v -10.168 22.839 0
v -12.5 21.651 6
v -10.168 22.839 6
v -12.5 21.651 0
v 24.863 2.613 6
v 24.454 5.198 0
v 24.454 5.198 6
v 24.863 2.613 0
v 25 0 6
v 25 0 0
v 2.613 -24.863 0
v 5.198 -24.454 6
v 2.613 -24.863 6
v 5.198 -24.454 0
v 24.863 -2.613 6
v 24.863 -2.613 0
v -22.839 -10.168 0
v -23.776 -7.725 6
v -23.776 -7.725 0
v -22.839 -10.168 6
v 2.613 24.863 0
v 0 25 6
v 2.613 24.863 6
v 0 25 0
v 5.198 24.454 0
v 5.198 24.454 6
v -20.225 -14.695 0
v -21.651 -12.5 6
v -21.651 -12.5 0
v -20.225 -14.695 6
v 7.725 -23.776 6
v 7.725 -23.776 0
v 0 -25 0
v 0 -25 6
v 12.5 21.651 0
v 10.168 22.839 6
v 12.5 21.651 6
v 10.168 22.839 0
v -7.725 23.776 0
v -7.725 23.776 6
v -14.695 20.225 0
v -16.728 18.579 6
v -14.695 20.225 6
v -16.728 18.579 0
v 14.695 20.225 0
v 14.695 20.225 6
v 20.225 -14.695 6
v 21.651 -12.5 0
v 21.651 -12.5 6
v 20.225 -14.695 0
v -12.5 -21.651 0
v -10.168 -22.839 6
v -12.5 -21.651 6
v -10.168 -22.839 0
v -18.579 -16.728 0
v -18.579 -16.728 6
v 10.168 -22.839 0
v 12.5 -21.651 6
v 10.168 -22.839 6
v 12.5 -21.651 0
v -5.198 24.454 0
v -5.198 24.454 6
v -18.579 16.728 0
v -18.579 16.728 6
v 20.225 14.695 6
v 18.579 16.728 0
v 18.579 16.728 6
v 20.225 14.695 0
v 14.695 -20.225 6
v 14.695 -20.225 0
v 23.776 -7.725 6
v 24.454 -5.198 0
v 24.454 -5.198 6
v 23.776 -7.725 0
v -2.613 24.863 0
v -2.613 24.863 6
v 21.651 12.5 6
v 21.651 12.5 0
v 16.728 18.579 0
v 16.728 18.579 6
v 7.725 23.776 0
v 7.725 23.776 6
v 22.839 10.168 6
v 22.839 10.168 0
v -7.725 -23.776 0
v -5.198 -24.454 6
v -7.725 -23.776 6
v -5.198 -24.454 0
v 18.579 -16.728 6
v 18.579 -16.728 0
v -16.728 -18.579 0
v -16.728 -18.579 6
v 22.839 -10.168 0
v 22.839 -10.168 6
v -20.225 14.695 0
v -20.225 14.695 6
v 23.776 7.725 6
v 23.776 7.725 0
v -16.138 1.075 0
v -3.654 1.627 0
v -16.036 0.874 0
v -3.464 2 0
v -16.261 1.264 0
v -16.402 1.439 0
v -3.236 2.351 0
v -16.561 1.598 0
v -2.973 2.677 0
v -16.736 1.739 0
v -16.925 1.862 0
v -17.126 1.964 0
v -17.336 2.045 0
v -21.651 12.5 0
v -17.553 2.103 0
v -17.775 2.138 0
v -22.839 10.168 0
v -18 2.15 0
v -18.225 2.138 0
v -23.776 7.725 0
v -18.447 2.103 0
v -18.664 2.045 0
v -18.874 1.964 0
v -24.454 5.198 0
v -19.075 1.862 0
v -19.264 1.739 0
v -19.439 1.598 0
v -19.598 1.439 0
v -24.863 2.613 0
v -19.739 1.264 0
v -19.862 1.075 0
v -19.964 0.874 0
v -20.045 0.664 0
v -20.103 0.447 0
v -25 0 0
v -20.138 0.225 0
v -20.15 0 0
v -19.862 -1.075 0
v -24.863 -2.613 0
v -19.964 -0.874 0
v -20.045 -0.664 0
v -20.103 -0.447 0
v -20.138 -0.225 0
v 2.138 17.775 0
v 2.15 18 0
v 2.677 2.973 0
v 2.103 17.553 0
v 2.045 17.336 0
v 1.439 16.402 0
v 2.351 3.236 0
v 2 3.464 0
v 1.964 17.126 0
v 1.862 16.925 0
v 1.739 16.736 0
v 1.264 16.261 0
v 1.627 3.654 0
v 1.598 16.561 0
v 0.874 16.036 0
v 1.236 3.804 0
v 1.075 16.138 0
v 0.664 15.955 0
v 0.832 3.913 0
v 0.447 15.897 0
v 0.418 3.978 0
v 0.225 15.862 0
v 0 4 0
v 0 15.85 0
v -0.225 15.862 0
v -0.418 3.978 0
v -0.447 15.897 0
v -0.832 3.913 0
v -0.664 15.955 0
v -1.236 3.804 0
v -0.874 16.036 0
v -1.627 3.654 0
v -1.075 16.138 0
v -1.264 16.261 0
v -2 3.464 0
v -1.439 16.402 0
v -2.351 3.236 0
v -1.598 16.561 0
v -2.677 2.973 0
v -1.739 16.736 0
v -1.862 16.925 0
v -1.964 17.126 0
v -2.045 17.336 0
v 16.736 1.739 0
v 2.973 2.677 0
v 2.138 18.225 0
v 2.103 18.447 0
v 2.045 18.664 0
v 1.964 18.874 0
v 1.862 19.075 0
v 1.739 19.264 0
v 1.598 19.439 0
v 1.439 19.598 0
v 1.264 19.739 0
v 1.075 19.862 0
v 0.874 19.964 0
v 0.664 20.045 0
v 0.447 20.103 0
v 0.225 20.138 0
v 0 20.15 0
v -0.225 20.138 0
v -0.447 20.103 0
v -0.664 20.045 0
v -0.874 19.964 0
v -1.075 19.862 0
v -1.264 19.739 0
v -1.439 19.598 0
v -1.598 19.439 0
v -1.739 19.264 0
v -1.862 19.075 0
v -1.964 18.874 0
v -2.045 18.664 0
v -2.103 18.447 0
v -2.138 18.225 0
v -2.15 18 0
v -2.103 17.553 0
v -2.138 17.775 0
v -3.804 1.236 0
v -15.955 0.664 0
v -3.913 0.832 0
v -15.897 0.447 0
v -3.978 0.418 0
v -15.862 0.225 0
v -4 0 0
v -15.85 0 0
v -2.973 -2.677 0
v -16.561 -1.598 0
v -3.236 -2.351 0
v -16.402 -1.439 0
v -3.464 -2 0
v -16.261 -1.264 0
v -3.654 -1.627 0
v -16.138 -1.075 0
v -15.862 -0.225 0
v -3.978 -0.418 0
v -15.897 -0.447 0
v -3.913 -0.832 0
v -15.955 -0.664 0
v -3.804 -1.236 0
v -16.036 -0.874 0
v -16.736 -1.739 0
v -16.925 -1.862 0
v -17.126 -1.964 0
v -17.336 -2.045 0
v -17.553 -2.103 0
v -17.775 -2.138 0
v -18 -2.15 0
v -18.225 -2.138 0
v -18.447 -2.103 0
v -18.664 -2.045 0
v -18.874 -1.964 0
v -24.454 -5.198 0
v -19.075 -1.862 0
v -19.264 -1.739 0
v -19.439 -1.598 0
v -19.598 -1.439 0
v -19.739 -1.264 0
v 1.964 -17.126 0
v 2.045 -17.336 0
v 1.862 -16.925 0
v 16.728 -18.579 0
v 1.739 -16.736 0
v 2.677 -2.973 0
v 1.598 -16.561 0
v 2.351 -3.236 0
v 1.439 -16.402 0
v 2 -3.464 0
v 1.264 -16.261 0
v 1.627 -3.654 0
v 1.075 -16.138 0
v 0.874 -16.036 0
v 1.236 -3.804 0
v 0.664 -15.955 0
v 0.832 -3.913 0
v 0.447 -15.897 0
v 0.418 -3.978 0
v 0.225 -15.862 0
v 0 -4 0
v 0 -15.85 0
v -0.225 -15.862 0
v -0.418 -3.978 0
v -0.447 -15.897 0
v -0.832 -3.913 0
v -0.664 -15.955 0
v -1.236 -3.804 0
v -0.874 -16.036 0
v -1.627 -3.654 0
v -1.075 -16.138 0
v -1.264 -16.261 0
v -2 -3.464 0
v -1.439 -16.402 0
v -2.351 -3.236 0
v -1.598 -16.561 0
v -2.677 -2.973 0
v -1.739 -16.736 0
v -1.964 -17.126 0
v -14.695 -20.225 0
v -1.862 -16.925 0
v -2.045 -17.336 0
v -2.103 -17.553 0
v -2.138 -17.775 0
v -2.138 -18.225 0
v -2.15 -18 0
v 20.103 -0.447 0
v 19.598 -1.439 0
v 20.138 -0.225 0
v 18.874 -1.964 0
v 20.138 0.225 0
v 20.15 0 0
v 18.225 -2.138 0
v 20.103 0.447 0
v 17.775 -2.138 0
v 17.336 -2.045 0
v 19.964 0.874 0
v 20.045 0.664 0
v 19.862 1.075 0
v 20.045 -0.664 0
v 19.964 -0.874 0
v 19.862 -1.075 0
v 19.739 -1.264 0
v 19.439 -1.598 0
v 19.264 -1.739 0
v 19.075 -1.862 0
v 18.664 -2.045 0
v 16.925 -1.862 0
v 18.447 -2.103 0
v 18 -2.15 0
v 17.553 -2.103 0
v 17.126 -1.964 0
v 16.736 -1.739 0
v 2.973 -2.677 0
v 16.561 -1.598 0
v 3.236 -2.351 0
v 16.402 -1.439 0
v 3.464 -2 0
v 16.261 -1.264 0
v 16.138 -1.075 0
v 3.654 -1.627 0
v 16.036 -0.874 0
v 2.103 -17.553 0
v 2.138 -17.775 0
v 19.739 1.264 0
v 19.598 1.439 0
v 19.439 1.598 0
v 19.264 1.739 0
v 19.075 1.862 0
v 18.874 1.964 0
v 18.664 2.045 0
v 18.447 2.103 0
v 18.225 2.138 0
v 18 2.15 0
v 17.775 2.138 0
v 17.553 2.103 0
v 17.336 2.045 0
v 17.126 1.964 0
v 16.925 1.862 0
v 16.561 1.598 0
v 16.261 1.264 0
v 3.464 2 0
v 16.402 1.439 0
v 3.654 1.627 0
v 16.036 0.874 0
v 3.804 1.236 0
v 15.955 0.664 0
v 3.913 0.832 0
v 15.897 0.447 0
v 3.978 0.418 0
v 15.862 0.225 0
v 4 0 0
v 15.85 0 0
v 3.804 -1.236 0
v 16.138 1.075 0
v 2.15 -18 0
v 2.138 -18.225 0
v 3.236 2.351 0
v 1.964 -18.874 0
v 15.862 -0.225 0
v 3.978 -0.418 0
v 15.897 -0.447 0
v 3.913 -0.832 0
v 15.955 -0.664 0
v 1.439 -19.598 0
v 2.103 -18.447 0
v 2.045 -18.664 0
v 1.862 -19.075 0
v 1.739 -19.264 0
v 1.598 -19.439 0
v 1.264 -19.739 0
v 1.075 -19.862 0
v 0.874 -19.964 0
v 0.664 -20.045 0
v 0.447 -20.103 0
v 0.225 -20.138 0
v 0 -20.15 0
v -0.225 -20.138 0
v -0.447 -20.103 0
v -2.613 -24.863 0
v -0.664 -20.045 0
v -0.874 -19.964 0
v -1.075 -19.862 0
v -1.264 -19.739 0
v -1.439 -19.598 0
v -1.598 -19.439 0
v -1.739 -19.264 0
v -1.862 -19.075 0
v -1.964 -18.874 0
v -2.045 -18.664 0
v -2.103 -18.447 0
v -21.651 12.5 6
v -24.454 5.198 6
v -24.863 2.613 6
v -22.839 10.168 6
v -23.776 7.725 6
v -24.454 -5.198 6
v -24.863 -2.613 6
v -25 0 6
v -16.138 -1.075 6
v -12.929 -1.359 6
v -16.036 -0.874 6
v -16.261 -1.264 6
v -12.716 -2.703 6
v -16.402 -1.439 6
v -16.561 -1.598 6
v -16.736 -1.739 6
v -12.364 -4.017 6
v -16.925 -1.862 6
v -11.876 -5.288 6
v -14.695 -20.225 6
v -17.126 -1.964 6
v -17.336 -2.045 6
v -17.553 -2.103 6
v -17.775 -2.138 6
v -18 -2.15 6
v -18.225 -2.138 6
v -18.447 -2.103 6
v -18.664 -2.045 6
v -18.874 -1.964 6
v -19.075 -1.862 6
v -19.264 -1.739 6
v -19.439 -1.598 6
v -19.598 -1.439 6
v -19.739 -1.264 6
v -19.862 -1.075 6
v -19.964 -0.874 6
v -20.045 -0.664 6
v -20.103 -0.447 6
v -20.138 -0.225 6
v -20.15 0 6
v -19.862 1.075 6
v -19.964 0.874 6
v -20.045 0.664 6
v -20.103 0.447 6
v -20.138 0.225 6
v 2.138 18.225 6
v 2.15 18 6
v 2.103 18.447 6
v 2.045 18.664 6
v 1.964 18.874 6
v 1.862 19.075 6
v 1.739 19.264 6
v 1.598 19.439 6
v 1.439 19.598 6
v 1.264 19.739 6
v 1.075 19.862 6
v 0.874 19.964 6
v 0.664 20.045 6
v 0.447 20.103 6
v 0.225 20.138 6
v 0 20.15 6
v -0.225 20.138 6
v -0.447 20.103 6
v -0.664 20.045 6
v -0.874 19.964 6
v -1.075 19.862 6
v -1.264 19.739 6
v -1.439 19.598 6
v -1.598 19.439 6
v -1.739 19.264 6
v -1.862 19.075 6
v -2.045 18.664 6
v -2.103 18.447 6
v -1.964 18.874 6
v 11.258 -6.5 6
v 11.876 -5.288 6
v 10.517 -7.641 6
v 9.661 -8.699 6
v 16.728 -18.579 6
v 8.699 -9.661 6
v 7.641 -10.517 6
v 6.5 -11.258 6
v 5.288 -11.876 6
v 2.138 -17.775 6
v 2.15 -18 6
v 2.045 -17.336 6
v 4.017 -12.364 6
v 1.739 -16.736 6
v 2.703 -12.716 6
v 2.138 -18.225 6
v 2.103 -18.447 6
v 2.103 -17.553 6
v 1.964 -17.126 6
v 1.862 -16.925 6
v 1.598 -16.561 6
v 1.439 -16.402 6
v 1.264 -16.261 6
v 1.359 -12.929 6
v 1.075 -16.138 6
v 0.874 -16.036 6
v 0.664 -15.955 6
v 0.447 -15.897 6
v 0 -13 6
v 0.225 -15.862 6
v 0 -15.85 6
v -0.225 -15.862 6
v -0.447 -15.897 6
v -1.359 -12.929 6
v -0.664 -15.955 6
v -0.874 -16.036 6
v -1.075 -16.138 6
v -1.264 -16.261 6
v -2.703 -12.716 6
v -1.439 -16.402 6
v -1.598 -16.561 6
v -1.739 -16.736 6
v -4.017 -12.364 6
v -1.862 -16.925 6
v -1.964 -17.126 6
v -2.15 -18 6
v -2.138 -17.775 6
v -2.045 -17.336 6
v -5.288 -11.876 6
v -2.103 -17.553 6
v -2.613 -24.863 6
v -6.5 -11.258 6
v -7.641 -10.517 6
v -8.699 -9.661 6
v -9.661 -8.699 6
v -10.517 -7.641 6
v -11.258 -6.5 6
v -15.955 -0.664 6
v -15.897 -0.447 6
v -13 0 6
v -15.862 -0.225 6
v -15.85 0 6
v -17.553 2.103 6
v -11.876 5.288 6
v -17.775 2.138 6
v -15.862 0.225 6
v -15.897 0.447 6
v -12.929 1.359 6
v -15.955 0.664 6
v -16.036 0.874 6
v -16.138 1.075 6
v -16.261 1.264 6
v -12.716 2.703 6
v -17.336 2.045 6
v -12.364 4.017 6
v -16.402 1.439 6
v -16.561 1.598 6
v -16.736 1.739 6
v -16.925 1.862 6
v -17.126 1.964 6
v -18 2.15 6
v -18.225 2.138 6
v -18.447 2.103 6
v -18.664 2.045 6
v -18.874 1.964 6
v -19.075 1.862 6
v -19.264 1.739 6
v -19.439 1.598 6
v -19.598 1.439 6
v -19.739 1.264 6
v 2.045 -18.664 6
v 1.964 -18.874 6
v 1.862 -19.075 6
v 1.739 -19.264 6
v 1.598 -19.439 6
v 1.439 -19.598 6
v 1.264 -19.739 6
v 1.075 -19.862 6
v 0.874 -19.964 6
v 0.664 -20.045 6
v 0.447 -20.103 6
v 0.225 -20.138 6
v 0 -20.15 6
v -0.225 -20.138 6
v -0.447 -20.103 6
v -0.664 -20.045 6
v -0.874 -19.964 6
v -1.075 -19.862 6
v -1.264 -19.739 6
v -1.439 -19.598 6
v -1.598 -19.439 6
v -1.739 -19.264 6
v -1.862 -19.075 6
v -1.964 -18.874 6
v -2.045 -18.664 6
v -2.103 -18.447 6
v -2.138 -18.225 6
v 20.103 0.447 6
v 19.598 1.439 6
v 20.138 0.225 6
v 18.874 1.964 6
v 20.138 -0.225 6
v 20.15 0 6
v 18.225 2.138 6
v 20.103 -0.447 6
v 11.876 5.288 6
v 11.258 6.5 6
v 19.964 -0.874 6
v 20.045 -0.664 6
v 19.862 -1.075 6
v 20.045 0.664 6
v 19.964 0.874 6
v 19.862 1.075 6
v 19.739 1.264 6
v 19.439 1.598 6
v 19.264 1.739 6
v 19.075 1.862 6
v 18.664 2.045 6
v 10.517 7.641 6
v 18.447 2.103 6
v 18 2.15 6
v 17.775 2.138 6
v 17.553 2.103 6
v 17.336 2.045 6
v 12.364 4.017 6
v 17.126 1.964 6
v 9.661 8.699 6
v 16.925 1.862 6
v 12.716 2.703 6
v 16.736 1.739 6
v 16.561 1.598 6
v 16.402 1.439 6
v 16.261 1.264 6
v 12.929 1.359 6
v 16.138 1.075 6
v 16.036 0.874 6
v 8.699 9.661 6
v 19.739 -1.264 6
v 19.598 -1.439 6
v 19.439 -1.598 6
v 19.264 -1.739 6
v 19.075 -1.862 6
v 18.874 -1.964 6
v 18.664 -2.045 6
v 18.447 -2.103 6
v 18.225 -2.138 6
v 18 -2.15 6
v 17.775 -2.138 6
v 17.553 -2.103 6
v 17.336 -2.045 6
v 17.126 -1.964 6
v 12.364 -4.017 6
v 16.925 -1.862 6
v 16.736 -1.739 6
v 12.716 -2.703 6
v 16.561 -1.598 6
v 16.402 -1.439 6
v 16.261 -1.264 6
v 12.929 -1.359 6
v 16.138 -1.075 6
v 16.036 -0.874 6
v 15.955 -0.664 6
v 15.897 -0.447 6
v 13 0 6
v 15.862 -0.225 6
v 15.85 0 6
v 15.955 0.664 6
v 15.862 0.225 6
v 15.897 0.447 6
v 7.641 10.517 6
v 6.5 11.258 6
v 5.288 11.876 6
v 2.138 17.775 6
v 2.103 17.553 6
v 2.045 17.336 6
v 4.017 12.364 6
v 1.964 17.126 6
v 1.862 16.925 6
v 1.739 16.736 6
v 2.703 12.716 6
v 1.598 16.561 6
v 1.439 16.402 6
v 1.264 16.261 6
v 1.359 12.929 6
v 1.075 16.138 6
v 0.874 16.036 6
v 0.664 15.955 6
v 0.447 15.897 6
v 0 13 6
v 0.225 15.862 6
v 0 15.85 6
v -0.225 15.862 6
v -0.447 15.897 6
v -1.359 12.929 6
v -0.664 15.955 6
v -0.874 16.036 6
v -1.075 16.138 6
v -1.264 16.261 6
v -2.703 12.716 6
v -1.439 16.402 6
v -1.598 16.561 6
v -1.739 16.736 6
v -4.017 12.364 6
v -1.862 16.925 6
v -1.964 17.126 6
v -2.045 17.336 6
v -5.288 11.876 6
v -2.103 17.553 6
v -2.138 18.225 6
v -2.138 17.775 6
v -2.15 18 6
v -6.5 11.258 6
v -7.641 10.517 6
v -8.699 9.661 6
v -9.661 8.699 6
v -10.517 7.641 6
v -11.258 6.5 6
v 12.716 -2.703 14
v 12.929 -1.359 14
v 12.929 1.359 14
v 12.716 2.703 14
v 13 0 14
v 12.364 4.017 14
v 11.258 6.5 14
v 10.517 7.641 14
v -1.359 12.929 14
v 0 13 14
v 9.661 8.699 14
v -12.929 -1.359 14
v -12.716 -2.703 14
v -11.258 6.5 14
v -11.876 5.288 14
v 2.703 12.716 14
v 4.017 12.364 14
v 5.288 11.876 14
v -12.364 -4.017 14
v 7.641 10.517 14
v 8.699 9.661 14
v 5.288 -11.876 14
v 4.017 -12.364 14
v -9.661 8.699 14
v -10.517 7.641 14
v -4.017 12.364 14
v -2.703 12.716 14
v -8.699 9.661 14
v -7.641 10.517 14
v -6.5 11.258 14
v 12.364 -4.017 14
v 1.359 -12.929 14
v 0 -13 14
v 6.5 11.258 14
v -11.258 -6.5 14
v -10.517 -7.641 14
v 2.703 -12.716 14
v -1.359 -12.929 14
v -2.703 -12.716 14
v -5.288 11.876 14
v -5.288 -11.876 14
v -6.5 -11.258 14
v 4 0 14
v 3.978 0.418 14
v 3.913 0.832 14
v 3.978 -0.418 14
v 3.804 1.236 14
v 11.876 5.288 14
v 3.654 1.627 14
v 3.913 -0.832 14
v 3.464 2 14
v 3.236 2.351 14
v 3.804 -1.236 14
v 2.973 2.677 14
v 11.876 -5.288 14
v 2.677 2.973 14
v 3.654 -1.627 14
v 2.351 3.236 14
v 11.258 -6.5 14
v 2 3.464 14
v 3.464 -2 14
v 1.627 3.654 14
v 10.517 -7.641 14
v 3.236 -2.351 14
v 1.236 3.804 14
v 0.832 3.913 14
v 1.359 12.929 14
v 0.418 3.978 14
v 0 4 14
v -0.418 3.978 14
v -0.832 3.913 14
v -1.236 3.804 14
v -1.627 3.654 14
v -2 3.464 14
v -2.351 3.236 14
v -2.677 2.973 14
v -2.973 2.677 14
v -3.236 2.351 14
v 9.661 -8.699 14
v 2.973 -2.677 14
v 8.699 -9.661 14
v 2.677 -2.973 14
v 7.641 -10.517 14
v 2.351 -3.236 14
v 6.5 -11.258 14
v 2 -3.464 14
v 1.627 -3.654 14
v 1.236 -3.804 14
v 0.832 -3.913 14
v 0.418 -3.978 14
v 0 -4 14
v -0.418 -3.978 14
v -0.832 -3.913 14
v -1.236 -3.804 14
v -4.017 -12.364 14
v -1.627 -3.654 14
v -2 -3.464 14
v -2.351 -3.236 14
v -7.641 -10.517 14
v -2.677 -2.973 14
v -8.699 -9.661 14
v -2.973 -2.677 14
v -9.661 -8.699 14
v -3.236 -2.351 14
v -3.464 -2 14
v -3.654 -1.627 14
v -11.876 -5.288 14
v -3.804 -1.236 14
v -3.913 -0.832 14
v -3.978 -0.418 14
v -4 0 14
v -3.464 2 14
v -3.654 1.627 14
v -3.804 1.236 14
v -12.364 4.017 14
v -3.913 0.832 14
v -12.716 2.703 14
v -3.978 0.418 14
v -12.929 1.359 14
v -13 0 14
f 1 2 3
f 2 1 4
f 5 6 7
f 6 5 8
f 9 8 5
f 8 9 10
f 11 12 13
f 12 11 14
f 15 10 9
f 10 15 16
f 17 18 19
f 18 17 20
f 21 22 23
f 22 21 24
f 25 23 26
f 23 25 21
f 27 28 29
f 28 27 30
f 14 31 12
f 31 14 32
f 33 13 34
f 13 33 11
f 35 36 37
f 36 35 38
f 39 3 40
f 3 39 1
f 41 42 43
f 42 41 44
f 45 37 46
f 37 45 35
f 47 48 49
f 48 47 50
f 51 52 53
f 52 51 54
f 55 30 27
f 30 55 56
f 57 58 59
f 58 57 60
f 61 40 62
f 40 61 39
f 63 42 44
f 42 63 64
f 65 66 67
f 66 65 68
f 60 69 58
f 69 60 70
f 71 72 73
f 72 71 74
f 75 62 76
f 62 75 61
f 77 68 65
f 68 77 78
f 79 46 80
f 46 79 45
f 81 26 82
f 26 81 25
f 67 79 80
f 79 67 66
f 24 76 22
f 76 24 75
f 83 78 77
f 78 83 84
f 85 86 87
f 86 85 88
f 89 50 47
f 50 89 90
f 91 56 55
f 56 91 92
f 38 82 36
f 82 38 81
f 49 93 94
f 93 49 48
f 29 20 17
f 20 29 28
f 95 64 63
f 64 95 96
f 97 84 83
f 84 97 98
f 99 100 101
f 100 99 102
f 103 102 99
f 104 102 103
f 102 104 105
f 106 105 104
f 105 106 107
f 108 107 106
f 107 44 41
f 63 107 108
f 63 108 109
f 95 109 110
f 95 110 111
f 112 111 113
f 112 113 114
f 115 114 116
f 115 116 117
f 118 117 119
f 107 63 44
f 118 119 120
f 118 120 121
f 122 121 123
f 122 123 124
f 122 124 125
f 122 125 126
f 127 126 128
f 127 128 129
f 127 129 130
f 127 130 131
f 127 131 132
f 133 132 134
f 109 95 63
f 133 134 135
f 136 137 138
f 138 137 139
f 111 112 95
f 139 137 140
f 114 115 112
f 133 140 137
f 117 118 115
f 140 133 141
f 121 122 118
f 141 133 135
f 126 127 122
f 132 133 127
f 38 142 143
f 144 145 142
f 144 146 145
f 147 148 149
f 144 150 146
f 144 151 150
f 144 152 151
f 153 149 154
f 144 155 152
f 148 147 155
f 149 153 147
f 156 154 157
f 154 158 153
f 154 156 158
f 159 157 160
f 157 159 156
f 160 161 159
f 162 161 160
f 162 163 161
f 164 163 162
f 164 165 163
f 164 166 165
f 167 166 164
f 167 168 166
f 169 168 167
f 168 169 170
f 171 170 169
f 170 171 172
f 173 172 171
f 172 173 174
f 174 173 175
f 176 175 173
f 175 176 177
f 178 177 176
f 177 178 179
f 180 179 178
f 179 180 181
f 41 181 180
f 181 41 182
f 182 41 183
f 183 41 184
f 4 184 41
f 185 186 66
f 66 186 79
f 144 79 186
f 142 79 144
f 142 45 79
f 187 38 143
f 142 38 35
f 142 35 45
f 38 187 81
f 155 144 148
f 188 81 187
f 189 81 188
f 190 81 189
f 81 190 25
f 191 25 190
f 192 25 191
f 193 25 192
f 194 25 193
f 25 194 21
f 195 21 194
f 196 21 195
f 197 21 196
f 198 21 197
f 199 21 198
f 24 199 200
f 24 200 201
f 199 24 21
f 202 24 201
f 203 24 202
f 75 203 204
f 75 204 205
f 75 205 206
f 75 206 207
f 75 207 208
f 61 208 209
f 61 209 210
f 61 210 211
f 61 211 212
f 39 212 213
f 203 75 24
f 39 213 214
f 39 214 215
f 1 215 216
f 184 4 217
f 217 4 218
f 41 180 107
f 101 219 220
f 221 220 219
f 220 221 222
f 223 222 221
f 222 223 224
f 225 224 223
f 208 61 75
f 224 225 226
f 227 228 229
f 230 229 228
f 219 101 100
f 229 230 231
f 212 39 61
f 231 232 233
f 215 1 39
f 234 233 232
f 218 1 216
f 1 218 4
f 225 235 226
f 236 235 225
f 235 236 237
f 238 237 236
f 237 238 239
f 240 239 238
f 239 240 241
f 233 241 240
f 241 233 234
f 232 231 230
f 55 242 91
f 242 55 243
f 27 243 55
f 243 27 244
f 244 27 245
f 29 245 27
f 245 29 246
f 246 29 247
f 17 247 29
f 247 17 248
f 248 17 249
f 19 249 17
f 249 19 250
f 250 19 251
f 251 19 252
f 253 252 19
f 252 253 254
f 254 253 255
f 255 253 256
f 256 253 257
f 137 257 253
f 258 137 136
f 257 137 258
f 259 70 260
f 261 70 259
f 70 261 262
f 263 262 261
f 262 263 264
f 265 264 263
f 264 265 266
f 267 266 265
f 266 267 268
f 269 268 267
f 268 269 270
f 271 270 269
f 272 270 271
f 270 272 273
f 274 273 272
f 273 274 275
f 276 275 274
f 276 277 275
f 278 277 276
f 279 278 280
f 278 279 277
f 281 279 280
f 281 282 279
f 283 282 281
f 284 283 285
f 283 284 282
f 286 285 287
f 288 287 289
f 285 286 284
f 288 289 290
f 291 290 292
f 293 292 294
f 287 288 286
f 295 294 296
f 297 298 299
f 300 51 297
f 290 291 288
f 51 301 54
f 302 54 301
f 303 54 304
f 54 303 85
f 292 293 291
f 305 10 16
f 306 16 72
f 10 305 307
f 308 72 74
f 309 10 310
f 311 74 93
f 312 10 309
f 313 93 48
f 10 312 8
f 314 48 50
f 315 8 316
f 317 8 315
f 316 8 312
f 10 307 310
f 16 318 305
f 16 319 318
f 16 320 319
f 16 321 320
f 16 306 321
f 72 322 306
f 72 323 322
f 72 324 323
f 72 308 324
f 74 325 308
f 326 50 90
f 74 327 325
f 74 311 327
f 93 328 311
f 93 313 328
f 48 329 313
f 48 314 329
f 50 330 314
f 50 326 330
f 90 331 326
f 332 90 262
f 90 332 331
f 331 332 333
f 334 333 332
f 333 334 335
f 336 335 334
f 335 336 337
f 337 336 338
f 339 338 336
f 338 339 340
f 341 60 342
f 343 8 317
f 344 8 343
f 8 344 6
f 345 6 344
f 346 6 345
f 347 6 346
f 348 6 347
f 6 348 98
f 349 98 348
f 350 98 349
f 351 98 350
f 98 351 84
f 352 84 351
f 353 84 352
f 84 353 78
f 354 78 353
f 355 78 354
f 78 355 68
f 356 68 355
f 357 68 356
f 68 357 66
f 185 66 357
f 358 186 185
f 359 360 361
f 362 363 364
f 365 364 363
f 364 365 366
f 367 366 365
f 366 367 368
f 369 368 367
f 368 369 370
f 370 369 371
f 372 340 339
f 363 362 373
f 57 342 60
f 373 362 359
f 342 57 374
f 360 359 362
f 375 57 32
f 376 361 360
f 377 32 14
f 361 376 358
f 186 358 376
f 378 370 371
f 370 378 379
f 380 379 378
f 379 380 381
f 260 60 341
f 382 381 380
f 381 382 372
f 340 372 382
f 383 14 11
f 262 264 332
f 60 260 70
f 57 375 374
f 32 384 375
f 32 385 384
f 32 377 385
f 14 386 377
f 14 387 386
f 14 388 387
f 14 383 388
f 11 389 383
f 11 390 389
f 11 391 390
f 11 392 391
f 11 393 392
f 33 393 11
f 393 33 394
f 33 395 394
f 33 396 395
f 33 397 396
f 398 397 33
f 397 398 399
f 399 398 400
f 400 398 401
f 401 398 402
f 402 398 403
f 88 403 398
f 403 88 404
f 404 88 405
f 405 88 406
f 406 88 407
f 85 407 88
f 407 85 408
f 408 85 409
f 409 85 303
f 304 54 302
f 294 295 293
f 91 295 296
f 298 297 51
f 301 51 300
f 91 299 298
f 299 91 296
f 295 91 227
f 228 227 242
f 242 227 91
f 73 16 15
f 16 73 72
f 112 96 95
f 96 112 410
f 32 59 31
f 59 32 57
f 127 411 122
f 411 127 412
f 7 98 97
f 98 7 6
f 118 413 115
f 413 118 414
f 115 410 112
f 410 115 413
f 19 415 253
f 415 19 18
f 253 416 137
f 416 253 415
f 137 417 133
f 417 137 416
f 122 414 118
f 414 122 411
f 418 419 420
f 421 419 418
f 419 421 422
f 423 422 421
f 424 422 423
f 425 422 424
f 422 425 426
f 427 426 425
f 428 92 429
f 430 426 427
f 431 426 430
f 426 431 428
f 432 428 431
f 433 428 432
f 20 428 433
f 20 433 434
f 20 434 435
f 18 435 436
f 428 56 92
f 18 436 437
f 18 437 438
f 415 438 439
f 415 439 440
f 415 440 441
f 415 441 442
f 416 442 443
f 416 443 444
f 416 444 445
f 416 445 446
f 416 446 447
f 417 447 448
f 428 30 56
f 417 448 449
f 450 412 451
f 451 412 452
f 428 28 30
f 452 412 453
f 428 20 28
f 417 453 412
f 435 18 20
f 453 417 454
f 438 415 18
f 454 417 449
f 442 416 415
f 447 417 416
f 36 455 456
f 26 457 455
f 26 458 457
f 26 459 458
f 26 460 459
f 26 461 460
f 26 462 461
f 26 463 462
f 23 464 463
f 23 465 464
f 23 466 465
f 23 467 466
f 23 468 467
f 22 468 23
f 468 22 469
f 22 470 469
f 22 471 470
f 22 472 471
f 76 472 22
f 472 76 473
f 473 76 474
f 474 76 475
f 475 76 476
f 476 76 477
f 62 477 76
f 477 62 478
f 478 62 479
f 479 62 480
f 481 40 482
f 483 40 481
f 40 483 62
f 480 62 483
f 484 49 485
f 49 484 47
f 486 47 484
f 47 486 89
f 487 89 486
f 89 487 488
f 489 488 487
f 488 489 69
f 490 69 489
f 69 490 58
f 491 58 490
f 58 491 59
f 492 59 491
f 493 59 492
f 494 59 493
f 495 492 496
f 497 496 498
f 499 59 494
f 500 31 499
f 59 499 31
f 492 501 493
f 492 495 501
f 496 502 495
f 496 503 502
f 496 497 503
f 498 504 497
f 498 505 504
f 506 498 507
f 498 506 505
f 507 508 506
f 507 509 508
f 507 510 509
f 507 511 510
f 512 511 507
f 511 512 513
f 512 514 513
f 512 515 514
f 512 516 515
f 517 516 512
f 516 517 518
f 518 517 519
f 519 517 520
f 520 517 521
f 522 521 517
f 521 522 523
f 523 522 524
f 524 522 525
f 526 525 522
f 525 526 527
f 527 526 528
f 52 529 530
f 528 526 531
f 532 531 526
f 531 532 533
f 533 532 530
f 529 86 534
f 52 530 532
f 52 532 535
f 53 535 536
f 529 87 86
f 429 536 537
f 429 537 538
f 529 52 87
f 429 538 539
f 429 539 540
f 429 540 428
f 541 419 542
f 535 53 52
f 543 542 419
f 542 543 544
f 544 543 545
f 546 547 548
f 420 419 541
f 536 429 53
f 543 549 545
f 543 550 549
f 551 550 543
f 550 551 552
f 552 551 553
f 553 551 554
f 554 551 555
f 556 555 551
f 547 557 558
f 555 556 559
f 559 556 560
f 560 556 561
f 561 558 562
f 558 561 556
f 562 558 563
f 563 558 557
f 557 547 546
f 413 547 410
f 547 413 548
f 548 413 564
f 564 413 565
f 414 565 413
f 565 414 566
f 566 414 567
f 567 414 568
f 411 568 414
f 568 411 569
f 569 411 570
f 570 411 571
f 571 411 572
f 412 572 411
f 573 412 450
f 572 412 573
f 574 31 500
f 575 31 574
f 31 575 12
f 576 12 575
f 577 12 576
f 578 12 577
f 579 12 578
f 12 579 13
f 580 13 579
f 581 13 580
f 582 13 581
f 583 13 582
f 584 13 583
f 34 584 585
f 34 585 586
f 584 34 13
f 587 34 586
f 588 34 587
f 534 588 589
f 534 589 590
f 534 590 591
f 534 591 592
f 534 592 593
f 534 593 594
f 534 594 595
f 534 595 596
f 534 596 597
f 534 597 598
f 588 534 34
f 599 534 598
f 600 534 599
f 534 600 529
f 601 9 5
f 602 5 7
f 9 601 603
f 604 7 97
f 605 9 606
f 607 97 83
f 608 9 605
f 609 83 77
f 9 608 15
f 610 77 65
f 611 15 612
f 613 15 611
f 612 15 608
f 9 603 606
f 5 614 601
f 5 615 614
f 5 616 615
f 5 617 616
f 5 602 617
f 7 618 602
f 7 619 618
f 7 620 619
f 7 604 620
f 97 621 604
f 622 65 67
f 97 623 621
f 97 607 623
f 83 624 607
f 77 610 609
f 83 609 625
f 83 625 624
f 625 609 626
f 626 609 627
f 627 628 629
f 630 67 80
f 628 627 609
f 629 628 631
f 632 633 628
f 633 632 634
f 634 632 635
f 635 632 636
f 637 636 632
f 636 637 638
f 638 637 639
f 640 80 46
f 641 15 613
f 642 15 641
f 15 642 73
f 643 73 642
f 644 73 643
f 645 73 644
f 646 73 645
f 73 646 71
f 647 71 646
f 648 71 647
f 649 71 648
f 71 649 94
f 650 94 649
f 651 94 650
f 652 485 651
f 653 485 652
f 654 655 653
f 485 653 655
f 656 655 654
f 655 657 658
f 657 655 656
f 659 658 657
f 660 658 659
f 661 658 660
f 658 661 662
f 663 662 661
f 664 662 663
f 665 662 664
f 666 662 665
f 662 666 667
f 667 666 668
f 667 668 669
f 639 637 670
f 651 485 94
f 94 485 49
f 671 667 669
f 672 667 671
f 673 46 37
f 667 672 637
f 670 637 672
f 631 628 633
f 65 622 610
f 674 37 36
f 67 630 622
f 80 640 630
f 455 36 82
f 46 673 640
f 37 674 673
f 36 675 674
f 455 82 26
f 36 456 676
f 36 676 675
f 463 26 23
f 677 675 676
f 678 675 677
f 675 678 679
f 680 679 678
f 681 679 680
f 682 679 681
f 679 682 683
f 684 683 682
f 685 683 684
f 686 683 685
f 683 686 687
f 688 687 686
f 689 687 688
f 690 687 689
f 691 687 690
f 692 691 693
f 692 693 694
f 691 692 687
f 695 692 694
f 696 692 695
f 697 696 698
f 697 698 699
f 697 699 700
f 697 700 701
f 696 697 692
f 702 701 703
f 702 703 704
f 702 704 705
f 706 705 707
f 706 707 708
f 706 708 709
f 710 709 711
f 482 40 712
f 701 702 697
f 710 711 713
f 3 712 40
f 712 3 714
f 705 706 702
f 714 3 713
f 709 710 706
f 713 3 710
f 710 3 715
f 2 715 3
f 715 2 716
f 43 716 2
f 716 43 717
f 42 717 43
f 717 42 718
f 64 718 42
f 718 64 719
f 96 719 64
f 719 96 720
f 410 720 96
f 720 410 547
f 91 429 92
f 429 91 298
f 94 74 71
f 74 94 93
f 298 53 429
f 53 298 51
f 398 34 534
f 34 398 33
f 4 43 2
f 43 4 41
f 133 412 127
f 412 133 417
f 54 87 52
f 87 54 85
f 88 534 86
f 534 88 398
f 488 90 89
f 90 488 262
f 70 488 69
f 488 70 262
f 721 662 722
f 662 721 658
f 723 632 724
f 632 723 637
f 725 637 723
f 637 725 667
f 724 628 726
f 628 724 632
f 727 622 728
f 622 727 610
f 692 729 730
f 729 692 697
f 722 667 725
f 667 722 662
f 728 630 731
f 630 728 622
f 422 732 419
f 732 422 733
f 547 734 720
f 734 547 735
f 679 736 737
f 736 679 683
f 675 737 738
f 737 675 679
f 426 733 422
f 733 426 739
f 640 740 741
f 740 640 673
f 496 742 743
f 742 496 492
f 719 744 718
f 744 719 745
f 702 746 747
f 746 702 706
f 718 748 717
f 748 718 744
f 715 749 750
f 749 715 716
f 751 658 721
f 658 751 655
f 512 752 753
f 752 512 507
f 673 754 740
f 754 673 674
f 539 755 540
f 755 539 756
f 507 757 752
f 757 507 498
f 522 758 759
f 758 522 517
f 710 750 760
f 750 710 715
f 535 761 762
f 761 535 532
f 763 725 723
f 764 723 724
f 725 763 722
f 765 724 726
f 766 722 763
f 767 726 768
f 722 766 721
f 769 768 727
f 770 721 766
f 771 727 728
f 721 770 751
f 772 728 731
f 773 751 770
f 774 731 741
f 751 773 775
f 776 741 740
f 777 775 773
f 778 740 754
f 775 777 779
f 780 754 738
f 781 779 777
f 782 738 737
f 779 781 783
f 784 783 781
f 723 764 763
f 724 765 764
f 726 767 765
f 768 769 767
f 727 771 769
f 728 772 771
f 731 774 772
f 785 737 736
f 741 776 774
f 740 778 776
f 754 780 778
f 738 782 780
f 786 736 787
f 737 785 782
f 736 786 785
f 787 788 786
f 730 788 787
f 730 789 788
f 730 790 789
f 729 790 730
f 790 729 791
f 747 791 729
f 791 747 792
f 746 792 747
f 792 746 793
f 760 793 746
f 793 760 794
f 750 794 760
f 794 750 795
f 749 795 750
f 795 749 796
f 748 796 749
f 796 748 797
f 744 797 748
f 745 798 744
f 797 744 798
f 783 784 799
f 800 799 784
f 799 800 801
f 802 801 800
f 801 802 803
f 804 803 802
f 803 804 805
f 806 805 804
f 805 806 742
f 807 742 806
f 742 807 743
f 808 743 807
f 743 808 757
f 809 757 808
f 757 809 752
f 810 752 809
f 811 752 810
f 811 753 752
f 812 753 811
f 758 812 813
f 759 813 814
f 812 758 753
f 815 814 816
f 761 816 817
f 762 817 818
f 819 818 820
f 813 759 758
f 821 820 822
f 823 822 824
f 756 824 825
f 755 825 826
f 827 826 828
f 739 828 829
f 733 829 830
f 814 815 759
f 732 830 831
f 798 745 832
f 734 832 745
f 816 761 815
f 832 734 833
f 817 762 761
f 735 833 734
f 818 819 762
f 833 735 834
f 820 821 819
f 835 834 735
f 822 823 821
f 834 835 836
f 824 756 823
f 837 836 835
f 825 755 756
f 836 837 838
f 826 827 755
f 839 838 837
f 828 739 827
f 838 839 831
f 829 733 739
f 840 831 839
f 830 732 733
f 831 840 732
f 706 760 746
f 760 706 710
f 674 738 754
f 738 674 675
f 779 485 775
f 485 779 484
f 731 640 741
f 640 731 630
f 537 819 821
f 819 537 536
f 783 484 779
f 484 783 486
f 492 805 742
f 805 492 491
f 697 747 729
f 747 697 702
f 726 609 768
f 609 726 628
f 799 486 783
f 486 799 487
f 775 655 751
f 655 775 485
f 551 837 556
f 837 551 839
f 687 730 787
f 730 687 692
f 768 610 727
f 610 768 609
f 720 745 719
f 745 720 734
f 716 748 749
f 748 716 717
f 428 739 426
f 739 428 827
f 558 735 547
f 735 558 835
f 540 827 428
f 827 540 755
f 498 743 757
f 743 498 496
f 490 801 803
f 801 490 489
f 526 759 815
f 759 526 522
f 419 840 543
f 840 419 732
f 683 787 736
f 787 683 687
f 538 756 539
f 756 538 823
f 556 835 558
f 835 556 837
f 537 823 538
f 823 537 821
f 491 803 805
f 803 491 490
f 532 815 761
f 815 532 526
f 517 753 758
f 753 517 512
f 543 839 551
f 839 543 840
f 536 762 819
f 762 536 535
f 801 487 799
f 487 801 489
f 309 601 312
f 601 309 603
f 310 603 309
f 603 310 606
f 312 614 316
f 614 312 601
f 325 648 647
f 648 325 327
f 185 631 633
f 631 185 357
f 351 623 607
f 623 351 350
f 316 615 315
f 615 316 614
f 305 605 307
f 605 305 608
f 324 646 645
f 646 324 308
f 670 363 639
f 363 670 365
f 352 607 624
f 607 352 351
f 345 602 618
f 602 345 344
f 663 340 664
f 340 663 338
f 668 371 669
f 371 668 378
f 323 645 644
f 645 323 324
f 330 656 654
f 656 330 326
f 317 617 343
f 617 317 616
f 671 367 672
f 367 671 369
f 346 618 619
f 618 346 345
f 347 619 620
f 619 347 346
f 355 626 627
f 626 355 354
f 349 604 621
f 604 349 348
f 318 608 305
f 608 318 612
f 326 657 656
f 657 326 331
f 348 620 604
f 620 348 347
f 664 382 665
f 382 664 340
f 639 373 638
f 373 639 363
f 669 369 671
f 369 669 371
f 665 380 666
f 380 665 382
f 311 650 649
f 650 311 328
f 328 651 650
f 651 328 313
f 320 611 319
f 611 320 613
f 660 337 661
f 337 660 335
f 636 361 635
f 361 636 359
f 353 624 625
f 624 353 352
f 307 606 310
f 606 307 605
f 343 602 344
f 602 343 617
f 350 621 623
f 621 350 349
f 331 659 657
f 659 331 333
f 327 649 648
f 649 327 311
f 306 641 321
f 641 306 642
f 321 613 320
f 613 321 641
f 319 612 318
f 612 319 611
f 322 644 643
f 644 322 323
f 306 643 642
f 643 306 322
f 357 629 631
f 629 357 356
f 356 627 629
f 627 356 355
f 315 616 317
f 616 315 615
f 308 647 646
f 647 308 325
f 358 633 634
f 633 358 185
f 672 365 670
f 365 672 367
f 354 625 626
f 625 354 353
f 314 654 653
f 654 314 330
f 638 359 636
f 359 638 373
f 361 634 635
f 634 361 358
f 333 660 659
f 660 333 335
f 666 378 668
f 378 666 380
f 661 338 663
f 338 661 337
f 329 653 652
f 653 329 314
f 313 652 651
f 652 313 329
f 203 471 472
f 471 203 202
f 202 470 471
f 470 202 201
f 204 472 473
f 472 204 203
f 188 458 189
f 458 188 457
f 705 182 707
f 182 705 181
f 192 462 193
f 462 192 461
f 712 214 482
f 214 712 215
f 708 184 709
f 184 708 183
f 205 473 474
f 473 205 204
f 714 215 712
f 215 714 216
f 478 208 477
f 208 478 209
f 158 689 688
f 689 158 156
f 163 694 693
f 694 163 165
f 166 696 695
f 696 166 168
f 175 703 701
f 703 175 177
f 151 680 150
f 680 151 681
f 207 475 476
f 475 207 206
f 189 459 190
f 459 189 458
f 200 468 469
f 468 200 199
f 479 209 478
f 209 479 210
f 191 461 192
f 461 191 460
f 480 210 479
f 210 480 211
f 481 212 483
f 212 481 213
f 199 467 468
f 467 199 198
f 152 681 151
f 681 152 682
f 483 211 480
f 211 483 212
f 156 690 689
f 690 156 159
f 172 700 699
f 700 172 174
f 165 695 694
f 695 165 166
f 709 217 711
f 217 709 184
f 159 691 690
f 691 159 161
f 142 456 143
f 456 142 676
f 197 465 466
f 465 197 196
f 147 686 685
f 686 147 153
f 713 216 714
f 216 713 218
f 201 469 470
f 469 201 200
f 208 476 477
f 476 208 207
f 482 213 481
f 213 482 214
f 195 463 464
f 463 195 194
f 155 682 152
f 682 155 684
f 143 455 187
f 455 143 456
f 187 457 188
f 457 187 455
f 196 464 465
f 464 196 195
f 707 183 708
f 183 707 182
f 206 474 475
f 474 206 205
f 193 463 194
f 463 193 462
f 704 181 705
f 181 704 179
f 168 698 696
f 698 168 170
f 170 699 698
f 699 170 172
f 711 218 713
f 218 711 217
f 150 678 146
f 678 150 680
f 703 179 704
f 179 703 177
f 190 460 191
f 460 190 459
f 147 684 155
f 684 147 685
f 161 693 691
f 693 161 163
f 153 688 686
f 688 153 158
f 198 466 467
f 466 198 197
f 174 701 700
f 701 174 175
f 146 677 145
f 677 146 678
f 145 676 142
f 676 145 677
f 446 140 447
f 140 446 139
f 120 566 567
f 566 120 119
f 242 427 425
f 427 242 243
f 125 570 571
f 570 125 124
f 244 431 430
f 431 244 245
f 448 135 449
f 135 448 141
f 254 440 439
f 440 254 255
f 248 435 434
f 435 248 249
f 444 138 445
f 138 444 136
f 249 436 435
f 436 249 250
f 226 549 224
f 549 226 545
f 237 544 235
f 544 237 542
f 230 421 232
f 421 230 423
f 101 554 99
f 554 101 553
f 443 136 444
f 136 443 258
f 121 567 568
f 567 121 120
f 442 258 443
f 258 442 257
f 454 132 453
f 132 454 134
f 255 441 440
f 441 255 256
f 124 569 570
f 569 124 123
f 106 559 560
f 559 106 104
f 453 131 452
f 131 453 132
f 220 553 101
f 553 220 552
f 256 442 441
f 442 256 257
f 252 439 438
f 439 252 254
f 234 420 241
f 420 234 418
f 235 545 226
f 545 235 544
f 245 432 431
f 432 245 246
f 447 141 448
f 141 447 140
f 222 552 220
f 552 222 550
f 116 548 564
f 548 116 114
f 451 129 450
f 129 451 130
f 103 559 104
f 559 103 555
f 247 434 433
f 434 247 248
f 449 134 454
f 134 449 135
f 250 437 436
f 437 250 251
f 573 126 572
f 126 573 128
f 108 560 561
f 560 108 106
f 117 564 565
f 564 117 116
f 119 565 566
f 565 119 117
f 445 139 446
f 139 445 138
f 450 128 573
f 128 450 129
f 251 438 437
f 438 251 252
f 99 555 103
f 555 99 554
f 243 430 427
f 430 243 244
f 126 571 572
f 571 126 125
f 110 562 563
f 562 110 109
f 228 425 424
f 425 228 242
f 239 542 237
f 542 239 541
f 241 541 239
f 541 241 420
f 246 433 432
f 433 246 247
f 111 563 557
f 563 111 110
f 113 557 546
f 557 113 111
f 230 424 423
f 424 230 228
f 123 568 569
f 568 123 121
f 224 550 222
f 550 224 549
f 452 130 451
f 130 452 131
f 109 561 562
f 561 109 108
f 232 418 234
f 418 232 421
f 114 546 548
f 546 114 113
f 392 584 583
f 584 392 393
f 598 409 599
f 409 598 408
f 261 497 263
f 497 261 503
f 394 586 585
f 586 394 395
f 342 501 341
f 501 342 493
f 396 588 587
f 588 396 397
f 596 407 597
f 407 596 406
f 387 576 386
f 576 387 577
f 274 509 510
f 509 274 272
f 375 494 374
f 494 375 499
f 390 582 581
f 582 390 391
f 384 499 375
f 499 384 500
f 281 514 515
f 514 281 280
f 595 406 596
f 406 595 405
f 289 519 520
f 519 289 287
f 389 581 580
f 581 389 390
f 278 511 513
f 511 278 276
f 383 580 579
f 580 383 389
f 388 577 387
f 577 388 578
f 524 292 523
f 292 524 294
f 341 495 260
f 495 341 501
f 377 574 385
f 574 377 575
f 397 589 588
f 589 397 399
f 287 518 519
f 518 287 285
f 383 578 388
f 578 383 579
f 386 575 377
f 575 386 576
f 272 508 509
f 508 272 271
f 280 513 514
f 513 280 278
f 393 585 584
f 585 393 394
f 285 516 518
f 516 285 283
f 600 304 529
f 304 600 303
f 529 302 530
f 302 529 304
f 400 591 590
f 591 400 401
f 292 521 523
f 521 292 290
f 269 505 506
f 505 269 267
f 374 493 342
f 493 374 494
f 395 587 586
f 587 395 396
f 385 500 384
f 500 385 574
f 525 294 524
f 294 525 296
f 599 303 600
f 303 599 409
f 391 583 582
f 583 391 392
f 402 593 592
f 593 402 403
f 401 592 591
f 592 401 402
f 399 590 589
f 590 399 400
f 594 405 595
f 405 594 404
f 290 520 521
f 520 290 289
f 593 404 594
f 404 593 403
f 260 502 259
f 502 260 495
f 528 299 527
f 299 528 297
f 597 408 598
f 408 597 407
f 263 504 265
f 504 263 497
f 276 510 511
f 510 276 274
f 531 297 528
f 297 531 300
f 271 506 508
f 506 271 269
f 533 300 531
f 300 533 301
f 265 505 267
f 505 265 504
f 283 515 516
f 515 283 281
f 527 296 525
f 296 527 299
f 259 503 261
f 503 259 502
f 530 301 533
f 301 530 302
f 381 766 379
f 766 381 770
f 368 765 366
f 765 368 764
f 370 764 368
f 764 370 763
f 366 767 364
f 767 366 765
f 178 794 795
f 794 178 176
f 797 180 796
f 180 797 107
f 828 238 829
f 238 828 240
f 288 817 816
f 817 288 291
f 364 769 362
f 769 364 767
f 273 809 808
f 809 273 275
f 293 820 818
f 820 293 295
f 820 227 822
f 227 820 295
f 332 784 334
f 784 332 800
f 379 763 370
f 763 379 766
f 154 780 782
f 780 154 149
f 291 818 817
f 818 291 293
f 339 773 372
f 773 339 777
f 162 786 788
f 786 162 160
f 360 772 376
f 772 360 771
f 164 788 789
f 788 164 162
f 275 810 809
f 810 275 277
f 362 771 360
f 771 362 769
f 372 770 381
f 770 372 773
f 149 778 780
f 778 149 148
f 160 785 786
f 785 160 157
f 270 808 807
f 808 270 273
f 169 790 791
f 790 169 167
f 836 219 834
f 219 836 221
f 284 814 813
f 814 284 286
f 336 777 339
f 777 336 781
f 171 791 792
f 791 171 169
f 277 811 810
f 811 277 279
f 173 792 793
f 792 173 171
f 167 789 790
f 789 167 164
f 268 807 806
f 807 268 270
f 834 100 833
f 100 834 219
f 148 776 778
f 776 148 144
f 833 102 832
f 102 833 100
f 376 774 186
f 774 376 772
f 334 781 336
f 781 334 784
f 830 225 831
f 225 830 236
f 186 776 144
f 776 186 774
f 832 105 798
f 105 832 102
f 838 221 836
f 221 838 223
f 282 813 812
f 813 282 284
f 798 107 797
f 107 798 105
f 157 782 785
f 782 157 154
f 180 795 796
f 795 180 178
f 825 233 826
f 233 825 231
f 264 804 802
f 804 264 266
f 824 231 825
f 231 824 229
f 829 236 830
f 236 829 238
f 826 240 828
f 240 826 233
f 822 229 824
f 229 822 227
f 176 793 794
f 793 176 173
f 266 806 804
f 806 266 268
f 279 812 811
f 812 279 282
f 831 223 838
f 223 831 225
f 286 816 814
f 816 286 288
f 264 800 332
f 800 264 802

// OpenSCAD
// 4-bolt mounting flange, 50 mm OD.
$fn = 60;
eps = 0.02;
flange_d = 50;
flange_t = 6;
hub_d = 26;
hub_h = 14;
center_d = 8;
bolt_circle_d = 36;
bolt_d = 4.3;
difference() {
    union() { cylinder(d = flange_d, h = flange_t); cylinder(d = hub_d, h = hub_h); }
    translate([0, 0, -eps]) cylinder(d = center_d, h = hub_h + 2 * eps);
    for (i = [0 : 3]) rotate([0, 0, i * 360 / 4])
        translate([bolt_circle_d / 2, 0, -eps]) cylinder(d = bolt_d, h = flange_t + 2 * eps);
}
